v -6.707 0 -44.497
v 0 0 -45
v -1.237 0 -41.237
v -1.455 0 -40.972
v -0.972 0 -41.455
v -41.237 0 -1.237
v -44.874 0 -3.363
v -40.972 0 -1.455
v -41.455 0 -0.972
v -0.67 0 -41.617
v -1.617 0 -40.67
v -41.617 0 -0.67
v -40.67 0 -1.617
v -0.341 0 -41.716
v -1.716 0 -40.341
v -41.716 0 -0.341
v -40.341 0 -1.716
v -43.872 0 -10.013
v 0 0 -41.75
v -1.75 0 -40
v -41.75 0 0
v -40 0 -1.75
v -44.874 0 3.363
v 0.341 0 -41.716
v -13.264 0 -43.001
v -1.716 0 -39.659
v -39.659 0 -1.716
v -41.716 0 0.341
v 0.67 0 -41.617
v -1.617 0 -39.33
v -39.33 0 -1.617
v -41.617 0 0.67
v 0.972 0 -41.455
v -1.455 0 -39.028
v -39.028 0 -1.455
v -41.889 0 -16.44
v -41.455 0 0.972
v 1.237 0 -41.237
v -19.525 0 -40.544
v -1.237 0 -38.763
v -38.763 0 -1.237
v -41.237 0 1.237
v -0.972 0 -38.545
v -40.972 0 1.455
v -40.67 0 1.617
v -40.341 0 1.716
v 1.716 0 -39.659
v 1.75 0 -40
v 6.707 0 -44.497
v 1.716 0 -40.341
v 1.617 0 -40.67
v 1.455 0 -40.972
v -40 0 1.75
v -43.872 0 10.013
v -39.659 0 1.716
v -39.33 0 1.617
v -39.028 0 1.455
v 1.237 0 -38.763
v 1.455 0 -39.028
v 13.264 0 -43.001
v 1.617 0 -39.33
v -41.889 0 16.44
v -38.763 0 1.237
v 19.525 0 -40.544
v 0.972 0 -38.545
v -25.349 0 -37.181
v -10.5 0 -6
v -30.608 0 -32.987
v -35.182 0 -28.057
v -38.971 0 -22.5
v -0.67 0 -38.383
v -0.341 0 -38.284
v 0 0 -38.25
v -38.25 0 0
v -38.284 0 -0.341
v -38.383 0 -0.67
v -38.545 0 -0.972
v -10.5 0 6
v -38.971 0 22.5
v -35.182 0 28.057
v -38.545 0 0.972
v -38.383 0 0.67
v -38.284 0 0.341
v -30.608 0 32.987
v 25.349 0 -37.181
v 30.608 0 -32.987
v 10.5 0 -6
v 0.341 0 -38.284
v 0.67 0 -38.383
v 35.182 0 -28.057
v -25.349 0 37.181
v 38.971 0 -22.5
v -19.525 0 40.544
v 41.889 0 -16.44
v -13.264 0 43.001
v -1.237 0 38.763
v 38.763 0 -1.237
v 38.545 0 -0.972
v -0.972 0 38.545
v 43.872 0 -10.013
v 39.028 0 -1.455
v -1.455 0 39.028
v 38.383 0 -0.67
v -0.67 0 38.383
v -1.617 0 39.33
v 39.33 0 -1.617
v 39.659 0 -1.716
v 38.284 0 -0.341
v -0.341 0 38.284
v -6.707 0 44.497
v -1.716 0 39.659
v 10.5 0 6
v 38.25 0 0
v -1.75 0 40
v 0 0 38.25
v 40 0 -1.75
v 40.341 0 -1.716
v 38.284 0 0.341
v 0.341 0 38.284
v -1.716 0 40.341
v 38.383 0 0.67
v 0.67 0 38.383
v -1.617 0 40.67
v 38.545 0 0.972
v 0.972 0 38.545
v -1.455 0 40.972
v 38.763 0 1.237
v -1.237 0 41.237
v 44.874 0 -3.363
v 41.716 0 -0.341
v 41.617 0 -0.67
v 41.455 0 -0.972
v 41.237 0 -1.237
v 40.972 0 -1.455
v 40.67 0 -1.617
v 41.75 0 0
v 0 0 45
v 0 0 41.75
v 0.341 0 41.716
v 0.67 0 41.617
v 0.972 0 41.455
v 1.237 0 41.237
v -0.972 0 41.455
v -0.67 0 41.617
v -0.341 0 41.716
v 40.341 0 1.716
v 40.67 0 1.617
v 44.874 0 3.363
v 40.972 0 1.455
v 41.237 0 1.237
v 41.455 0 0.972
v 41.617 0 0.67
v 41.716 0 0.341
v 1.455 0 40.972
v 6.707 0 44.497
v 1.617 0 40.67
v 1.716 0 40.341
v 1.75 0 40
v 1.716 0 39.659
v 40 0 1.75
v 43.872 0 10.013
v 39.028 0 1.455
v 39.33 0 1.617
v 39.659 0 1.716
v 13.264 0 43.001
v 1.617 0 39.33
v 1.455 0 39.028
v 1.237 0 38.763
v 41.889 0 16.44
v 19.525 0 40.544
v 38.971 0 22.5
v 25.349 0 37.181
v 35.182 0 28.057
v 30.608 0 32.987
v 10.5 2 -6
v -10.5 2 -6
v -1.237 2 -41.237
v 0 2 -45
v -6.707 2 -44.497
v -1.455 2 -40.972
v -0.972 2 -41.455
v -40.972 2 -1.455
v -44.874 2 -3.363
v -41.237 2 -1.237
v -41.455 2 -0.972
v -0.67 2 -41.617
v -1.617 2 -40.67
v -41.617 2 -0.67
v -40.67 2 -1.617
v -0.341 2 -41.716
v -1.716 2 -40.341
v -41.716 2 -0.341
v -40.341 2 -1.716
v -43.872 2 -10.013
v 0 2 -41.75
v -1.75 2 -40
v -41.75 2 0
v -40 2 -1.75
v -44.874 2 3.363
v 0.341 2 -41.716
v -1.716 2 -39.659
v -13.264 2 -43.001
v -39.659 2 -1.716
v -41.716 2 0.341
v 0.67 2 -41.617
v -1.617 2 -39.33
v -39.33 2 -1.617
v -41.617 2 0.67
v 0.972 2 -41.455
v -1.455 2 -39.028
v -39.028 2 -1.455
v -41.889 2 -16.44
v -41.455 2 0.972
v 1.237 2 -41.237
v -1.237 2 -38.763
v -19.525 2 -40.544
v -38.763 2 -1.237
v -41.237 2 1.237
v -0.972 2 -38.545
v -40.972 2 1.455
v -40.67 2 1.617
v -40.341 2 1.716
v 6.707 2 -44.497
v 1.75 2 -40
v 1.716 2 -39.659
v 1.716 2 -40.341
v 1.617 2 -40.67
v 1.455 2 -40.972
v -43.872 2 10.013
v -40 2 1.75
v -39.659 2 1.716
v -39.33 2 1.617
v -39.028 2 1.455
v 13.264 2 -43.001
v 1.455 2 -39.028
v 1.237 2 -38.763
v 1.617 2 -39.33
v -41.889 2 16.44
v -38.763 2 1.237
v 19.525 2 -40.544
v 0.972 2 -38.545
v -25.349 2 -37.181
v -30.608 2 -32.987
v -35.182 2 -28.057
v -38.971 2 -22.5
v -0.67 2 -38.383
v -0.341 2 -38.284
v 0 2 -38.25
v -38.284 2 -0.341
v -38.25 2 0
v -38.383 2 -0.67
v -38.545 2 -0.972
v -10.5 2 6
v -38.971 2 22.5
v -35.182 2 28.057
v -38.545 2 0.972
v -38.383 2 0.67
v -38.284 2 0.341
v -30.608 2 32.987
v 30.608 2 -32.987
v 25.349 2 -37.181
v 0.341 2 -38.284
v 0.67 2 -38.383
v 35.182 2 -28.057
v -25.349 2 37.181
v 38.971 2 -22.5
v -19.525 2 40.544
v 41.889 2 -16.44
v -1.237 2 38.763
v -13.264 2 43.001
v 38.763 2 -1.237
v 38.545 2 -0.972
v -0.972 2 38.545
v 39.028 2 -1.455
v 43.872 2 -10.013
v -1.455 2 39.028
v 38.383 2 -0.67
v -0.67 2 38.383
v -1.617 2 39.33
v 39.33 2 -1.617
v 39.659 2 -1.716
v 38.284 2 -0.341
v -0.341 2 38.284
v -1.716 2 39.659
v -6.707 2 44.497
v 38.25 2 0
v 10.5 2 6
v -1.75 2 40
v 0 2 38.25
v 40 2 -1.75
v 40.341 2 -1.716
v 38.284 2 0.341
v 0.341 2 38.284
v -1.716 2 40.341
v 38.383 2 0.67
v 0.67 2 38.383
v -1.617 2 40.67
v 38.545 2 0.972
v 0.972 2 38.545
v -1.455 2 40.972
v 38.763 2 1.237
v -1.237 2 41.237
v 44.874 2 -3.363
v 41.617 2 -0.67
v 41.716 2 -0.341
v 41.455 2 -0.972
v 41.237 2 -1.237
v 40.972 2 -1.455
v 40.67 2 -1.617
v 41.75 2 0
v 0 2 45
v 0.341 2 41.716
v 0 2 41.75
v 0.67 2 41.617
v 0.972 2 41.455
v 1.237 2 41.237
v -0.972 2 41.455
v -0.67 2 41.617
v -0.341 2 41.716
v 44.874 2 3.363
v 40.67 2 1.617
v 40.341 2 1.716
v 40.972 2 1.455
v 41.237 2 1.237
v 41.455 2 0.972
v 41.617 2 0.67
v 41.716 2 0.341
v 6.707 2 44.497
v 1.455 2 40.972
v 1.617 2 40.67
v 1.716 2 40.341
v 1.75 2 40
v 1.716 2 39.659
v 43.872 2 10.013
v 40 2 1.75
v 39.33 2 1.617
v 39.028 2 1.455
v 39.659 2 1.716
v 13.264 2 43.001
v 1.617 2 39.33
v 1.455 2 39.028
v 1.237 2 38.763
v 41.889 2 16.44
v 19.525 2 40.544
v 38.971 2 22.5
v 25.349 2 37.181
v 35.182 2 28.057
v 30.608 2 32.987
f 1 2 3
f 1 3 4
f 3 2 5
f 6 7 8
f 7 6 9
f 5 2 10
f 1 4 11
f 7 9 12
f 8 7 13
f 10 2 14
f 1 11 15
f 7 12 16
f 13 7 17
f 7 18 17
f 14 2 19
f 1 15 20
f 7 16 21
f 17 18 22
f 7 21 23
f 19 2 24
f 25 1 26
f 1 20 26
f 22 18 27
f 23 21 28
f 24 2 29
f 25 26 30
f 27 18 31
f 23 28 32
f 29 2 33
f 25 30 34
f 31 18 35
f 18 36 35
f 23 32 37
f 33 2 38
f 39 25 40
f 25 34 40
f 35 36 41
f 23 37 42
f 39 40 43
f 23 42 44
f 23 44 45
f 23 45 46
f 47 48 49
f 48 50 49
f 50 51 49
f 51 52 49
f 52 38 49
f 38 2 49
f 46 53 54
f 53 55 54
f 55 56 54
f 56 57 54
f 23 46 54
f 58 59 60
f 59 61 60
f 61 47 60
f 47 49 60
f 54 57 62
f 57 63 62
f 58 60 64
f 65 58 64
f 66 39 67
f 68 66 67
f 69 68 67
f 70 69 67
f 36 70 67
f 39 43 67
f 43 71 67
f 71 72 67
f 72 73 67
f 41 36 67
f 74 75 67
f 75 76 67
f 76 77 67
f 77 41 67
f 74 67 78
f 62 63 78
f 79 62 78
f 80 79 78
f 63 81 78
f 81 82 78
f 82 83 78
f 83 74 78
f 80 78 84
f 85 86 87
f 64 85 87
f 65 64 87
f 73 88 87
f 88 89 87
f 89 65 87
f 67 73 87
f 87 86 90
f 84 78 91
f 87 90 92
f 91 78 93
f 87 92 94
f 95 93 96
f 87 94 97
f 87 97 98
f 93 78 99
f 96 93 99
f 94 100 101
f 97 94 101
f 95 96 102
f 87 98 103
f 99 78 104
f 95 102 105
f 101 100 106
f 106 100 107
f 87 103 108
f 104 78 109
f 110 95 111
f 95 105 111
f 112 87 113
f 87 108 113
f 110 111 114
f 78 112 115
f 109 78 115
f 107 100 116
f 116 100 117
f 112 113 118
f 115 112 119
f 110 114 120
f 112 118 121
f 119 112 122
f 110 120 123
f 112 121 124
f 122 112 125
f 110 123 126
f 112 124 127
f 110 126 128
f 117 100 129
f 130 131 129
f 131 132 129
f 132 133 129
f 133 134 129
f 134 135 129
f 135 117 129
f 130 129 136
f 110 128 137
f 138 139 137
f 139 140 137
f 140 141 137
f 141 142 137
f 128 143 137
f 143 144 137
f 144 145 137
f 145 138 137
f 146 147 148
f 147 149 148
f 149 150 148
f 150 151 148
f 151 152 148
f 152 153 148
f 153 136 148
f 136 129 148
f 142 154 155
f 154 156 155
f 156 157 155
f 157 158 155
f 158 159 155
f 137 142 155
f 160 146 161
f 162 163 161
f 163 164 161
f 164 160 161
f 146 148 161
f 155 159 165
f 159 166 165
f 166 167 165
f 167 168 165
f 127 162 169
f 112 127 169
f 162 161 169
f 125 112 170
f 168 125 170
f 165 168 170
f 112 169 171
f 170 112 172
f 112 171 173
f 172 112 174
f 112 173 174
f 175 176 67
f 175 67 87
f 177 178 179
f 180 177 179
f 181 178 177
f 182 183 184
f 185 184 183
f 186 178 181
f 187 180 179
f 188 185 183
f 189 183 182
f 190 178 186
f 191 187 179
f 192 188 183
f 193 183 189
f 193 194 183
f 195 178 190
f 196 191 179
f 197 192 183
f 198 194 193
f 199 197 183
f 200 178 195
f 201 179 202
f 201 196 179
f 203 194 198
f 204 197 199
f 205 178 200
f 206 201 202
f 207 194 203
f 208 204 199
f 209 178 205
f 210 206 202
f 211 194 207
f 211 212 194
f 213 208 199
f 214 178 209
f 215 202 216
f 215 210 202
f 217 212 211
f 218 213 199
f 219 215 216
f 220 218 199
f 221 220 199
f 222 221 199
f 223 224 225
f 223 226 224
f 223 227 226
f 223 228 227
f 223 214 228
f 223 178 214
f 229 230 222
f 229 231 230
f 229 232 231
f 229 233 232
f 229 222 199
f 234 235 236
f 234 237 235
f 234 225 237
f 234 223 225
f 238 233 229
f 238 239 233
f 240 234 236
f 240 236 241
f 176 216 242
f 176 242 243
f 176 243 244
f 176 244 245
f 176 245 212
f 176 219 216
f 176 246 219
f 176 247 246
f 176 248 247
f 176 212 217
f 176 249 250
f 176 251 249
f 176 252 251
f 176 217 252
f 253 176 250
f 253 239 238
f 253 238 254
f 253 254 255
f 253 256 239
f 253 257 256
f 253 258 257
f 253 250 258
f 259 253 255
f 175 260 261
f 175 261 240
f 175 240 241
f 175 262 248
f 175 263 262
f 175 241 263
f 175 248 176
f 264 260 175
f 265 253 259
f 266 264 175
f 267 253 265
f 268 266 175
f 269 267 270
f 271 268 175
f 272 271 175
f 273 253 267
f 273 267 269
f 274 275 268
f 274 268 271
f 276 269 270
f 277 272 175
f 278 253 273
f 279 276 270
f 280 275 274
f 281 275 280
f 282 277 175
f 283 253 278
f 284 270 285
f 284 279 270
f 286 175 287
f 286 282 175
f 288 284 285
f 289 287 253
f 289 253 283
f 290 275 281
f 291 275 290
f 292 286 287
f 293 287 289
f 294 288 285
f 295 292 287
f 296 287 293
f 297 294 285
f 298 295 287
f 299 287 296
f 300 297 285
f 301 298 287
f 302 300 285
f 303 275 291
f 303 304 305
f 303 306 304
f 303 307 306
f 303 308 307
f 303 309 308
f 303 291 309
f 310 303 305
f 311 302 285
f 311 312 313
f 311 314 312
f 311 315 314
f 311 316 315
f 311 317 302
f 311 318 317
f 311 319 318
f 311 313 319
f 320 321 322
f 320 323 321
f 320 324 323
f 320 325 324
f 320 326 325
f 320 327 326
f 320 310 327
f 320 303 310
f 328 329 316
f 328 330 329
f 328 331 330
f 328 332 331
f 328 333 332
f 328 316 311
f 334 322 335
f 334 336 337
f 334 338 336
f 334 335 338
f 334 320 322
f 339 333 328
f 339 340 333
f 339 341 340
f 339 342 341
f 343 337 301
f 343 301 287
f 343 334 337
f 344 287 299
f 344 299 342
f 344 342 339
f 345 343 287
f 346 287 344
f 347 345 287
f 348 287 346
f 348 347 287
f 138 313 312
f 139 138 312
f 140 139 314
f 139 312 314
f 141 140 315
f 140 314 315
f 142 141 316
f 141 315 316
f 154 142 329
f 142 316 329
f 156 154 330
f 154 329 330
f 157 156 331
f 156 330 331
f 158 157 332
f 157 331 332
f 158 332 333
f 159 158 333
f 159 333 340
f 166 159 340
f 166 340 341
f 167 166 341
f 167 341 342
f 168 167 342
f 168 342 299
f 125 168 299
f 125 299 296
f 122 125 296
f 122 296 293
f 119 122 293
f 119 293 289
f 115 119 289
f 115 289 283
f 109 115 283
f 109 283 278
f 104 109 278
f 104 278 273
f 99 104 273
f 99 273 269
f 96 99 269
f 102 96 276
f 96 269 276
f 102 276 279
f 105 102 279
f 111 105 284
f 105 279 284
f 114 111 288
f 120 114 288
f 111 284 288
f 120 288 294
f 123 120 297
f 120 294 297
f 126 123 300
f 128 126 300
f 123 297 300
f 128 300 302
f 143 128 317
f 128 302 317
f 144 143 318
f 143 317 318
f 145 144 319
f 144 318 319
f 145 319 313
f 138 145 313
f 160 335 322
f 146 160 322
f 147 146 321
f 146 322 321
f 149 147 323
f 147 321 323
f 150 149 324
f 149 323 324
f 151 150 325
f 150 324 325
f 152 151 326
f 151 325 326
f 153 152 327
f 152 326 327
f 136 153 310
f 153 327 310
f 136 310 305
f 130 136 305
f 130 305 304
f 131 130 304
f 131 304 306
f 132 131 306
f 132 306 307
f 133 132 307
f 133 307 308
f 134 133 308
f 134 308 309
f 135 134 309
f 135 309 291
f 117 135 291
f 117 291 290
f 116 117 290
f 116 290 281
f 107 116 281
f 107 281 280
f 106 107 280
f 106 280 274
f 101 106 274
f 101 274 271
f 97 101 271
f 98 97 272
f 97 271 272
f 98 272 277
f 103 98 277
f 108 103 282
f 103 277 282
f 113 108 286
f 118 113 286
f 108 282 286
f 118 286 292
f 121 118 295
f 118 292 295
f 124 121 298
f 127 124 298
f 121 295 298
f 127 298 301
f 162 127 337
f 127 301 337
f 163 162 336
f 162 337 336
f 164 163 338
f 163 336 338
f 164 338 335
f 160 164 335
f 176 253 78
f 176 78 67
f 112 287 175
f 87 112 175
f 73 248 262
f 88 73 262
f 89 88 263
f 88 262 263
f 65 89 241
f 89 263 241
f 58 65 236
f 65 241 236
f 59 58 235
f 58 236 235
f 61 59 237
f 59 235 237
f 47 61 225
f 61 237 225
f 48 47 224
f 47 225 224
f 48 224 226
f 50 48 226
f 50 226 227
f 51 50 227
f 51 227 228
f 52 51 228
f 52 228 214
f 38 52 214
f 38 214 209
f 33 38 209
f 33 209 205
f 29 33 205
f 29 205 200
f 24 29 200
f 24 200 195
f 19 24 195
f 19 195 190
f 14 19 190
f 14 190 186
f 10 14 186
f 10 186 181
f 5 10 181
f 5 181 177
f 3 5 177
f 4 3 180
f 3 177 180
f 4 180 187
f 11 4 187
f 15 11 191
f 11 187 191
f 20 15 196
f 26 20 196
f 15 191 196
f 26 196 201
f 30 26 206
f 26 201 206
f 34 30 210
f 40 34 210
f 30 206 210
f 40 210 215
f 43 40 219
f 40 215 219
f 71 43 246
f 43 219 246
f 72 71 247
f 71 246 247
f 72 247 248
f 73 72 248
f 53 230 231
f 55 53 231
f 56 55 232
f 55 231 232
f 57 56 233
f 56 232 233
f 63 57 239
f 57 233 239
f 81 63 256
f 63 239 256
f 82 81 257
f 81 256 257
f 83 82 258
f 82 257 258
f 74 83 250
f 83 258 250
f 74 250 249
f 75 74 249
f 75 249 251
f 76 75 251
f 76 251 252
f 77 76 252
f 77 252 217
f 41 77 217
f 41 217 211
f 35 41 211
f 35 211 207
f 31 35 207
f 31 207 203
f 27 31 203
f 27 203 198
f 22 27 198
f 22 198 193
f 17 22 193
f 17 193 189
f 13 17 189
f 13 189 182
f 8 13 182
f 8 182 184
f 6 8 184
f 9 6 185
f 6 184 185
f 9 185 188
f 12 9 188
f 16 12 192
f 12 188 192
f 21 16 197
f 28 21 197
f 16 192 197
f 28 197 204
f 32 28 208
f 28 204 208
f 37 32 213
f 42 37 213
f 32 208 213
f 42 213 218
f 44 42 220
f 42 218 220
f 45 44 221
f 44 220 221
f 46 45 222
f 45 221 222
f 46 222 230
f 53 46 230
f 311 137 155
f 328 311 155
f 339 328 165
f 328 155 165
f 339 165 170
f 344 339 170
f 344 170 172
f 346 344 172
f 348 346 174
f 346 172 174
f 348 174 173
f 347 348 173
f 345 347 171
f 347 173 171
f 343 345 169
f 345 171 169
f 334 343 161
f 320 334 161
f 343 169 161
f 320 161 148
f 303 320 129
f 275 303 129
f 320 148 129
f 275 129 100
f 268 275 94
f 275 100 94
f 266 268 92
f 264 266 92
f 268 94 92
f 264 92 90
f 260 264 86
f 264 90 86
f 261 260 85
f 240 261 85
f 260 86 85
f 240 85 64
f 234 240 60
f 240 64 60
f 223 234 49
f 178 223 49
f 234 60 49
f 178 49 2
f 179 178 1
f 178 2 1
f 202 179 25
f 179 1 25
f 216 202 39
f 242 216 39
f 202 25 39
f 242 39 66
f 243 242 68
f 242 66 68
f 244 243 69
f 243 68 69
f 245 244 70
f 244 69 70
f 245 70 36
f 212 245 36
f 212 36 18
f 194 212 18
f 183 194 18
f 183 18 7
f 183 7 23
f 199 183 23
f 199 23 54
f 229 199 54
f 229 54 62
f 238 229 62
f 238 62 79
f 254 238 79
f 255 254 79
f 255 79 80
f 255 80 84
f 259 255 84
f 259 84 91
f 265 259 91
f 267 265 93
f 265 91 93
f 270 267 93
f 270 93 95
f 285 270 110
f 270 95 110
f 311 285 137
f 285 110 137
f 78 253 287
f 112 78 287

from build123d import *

# Parameters (mm, degrees)
SKETCH1_R           = 45
BOSS_EXTRUDE1_DEPTH = 2
SKETCH3_R           = 1.75
CUT_EXTRUDE1_DEPTH  = 64.671029519
SKETCH4_W           = 21
SKETCH4_H           = 12
CUT_EXTRUDE2_DEPTH  = 64.671029519


with BuildPart() as part:
    # Sketch1 → Boss-Extrude1 (new body)
    with BuildSketch(Plane(origin=(0, 0, 0), x_dir=(1, 0, 0), z_dir=(0, 1, 0))):
        with Locations(Location((0, 0, 0), (0, 0, 270))):
            Circle(SKETCH1_R)
    extrude(amount=BOSS_EXTRUDE1_DEPTH)

    # Sketch3 → Cut-Extrude1 (cut, through all)
    with BuildSketch(Plane(origin=(0, 2, 0), x_dir=(1, 0, 0), z_dir=(0, 1, 0))):
        with Locations(Location((0, 40, 0), (0, 0, 270))):
            Circle(SKETCH3_R)
        with Locations(Location((40, 0, 0), (0, 0, 270))):
            Circle(SKETCH3_R)
        with Locations(Location((0, -40, 0), (0, 0, 270))):
            Circle(SKETCH3_R)
        with Locations(Location((-40, 0, 0), (0, 0, 270))):
            Circle(SKETCH3_R)
    extrude(amount=-CUT_EXTRUDE1_DEPTH, mode=Mode.SUBTRACT)

    # Sketch4 → Cut-Extrude2 (cut, through all)
    with BuildSketch(Plane(origin=(0, 2, 0), x_dir=(1, 0, 0), z_dir=(0, 1, 0))):
        Rectangle(SKETCH4_W, SKETCH4_H)
    extrude(amount=-CUT_EXTRUDE2_DEPTH, mode=Mode.SUBTRACT)


solid = part.part
